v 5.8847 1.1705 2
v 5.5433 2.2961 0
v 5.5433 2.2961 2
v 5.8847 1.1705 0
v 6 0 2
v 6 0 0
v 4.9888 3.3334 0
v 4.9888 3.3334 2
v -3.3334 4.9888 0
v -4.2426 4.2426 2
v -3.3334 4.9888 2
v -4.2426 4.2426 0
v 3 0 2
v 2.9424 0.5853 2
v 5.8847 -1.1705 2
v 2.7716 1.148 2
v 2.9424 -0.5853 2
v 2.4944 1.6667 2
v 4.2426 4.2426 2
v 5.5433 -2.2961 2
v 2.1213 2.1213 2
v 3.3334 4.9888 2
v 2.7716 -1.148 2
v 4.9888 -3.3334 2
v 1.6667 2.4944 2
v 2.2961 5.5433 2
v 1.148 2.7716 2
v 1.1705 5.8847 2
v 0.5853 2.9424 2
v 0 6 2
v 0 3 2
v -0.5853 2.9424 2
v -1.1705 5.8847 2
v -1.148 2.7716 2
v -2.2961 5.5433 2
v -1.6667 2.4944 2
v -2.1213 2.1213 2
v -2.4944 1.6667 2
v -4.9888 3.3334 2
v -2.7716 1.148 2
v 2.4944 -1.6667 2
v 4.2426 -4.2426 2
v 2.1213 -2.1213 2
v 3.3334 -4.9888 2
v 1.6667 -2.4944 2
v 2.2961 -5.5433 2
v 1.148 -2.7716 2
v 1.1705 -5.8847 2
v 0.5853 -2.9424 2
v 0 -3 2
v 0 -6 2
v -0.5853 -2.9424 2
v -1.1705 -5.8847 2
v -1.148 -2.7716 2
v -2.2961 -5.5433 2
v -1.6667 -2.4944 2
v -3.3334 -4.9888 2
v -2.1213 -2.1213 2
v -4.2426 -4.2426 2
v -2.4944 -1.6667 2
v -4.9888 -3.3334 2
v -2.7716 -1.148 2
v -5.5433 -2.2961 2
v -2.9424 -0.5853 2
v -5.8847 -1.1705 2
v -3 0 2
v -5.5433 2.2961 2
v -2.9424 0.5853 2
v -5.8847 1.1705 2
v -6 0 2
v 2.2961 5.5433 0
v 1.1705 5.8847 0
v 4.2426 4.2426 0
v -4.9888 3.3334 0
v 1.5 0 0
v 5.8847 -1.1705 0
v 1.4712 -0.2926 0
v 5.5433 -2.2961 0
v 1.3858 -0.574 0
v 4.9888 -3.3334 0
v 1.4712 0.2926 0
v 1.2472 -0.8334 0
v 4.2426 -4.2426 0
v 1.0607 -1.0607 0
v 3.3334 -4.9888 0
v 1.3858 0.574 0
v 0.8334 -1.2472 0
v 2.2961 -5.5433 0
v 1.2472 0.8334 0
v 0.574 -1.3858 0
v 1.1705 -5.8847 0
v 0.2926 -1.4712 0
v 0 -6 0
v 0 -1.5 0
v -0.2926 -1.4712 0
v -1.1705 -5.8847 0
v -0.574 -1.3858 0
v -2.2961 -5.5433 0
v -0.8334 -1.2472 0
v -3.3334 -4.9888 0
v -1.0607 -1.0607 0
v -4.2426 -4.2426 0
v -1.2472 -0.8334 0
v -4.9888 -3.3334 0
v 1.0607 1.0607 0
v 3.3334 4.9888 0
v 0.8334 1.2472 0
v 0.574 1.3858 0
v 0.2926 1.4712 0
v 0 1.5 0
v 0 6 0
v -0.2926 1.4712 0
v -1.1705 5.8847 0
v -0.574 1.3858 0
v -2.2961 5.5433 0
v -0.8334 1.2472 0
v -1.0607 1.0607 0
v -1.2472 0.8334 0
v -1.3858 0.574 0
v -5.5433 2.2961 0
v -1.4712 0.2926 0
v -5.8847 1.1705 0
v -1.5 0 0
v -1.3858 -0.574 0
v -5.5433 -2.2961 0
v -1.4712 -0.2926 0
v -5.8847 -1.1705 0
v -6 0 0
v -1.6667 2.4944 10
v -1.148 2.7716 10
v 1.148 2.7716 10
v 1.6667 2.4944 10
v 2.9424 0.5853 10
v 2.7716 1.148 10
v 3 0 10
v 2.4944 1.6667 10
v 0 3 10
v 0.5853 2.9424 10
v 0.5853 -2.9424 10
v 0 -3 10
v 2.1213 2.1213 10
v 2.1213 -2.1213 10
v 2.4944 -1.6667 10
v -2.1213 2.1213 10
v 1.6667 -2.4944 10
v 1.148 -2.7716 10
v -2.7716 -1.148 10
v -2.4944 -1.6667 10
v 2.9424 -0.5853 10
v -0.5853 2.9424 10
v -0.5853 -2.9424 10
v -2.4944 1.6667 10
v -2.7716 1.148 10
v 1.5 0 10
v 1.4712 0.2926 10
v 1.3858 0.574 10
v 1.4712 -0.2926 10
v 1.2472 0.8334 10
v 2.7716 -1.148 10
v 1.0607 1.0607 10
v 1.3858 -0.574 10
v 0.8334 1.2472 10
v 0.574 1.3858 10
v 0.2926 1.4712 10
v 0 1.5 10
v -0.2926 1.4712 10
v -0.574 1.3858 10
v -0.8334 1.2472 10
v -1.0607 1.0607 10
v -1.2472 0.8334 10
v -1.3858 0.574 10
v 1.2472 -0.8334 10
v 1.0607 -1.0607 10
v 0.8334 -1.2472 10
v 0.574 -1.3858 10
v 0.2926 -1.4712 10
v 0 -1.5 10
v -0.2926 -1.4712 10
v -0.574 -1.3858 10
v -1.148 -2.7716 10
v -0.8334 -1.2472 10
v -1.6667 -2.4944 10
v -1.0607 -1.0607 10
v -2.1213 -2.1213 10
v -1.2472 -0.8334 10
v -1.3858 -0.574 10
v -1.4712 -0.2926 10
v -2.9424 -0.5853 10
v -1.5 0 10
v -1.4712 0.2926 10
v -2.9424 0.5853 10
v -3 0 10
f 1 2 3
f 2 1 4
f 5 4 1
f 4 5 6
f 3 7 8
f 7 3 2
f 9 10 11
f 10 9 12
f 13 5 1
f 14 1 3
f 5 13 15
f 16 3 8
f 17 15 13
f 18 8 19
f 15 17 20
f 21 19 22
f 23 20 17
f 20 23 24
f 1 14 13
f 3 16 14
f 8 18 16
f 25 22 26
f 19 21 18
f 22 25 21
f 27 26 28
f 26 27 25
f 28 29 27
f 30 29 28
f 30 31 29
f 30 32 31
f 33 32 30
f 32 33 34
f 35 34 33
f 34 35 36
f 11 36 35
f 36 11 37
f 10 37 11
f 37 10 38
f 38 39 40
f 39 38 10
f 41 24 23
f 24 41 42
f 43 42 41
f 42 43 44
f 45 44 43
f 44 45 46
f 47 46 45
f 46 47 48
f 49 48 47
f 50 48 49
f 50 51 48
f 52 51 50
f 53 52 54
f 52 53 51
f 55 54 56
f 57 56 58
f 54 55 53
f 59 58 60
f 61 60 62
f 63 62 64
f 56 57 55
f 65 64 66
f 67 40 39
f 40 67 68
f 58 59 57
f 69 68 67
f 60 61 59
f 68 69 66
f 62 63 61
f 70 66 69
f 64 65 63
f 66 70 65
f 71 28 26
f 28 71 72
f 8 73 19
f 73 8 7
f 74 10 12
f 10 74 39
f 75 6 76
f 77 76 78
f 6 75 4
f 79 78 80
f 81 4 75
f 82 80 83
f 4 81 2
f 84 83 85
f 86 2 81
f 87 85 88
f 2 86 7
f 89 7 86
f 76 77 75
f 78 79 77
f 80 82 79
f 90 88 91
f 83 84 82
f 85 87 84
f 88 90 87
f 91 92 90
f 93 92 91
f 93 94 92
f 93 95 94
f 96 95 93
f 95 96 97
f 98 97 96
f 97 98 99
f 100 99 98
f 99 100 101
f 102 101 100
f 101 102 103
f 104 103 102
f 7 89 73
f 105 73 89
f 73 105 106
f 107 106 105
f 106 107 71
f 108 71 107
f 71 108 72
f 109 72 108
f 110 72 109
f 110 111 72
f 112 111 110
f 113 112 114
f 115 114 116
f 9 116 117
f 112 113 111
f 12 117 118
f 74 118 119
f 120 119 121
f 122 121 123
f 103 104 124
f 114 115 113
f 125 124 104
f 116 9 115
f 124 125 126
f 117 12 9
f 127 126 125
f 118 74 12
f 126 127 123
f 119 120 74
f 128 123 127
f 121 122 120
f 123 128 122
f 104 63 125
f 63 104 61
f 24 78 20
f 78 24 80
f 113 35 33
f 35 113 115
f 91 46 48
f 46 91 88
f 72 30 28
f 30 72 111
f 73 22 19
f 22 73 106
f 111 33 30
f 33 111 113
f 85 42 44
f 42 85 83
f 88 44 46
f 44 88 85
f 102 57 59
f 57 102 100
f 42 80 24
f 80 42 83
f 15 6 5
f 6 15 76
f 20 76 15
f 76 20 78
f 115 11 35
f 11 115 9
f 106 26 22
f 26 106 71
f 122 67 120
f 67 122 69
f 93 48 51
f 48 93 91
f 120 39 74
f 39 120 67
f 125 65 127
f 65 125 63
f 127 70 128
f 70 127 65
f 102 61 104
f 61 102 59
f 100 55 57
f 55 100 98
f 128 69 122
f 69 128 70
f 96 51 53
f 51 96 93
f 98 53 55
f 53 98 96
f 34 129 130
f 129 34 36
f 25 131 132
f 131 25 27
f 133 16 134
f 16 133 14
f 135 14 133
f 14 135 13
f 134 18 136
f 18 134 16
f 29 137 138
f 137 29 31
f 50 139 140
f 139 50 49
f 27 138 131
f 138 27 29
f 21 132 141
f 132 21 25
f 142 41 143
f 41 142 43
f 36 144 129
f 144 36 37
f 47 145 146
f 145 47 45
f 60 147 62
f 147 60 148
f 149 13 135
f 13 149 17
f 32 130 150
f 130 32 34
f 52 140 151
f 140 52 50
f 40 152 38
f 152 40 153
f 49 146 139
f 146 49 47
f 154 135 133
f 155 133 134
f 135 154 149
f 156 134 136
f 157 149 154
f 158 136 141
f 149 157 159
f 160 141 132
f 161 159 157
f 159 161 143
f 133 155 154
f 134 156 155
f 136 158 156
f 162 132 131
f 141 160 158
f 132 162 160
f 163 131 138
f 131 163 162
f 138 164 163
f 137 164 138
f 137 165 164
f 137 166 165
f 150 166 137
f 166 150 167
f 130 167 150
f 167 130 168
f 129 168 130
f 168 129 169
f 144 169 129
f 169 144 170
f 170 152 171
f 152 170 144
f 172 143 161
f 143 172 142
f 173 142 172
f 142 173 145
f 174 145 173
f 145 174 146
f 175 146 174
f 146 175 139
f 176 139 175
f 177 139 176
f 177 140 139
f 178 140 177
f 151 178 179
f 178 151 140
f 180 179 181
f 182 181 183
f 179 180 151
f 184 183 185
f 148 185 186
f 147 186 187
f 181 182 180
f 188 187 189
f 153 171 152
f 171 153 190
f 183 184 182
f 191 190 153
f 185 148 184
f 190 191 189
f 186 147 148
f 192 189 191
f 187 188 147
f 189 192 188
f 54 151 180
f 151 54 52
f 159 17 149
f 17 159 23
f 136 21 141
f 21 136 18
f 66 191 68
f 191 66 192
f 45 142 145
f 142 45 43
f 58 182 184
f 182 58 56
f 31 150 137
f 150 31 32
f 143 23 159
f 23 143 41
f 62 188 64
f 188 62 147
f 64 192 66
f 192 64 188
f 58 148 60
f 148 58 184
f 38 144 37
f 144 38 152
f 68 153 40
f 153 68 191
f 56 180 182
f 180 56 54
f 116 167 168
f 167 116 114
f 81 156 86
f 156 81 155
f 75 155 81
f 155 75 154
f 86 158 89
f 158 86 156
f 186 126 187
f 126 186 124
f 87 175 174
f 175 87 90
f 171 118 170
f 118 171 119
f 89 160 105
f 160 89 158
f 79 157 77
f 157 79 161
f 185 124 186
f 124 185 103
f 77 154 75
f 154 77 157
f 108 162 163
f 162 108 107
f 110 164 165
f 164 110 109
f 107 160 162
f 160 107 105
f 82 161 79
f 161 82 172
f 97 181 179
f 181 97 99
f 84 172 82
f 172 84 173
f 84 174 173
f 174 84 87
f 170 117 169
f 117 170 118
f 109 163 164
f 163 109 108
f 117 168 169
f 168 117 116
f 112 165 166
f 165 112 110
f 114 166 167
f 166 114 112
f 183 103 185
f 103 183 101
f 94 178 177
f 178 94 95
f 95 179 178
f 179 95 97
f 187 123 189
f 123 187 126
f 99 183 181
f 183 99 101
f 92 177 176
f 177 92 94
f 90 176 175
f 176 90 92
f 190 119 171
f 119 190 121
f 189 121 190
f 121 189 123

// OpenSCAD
$fn = 32;

// ----------------------------------------------------------------------
// Micro post: flanged post, 5-20 mm class
// ----------------------------------------------------------------------

// --- parameters (mm) ---
post_d = 6;               // post diameter
post_h = 8;               // post height above the flange
flange_d = 12;            // flange diameter
flange_t = 2;             // flange thickness
bore_d = 3;               // through bore

total_h = post_h + flange_t;  // overall height

difference() {
  union() {
    cylinder(h = flange_t, d = flange_d);
    translate([0, 0, flange_t]) cylinder(h = post_h, d = post_d);
  }
  translate([0, 0, -1]) cylinder(h = total_h + 2, d = bore_d);
}
